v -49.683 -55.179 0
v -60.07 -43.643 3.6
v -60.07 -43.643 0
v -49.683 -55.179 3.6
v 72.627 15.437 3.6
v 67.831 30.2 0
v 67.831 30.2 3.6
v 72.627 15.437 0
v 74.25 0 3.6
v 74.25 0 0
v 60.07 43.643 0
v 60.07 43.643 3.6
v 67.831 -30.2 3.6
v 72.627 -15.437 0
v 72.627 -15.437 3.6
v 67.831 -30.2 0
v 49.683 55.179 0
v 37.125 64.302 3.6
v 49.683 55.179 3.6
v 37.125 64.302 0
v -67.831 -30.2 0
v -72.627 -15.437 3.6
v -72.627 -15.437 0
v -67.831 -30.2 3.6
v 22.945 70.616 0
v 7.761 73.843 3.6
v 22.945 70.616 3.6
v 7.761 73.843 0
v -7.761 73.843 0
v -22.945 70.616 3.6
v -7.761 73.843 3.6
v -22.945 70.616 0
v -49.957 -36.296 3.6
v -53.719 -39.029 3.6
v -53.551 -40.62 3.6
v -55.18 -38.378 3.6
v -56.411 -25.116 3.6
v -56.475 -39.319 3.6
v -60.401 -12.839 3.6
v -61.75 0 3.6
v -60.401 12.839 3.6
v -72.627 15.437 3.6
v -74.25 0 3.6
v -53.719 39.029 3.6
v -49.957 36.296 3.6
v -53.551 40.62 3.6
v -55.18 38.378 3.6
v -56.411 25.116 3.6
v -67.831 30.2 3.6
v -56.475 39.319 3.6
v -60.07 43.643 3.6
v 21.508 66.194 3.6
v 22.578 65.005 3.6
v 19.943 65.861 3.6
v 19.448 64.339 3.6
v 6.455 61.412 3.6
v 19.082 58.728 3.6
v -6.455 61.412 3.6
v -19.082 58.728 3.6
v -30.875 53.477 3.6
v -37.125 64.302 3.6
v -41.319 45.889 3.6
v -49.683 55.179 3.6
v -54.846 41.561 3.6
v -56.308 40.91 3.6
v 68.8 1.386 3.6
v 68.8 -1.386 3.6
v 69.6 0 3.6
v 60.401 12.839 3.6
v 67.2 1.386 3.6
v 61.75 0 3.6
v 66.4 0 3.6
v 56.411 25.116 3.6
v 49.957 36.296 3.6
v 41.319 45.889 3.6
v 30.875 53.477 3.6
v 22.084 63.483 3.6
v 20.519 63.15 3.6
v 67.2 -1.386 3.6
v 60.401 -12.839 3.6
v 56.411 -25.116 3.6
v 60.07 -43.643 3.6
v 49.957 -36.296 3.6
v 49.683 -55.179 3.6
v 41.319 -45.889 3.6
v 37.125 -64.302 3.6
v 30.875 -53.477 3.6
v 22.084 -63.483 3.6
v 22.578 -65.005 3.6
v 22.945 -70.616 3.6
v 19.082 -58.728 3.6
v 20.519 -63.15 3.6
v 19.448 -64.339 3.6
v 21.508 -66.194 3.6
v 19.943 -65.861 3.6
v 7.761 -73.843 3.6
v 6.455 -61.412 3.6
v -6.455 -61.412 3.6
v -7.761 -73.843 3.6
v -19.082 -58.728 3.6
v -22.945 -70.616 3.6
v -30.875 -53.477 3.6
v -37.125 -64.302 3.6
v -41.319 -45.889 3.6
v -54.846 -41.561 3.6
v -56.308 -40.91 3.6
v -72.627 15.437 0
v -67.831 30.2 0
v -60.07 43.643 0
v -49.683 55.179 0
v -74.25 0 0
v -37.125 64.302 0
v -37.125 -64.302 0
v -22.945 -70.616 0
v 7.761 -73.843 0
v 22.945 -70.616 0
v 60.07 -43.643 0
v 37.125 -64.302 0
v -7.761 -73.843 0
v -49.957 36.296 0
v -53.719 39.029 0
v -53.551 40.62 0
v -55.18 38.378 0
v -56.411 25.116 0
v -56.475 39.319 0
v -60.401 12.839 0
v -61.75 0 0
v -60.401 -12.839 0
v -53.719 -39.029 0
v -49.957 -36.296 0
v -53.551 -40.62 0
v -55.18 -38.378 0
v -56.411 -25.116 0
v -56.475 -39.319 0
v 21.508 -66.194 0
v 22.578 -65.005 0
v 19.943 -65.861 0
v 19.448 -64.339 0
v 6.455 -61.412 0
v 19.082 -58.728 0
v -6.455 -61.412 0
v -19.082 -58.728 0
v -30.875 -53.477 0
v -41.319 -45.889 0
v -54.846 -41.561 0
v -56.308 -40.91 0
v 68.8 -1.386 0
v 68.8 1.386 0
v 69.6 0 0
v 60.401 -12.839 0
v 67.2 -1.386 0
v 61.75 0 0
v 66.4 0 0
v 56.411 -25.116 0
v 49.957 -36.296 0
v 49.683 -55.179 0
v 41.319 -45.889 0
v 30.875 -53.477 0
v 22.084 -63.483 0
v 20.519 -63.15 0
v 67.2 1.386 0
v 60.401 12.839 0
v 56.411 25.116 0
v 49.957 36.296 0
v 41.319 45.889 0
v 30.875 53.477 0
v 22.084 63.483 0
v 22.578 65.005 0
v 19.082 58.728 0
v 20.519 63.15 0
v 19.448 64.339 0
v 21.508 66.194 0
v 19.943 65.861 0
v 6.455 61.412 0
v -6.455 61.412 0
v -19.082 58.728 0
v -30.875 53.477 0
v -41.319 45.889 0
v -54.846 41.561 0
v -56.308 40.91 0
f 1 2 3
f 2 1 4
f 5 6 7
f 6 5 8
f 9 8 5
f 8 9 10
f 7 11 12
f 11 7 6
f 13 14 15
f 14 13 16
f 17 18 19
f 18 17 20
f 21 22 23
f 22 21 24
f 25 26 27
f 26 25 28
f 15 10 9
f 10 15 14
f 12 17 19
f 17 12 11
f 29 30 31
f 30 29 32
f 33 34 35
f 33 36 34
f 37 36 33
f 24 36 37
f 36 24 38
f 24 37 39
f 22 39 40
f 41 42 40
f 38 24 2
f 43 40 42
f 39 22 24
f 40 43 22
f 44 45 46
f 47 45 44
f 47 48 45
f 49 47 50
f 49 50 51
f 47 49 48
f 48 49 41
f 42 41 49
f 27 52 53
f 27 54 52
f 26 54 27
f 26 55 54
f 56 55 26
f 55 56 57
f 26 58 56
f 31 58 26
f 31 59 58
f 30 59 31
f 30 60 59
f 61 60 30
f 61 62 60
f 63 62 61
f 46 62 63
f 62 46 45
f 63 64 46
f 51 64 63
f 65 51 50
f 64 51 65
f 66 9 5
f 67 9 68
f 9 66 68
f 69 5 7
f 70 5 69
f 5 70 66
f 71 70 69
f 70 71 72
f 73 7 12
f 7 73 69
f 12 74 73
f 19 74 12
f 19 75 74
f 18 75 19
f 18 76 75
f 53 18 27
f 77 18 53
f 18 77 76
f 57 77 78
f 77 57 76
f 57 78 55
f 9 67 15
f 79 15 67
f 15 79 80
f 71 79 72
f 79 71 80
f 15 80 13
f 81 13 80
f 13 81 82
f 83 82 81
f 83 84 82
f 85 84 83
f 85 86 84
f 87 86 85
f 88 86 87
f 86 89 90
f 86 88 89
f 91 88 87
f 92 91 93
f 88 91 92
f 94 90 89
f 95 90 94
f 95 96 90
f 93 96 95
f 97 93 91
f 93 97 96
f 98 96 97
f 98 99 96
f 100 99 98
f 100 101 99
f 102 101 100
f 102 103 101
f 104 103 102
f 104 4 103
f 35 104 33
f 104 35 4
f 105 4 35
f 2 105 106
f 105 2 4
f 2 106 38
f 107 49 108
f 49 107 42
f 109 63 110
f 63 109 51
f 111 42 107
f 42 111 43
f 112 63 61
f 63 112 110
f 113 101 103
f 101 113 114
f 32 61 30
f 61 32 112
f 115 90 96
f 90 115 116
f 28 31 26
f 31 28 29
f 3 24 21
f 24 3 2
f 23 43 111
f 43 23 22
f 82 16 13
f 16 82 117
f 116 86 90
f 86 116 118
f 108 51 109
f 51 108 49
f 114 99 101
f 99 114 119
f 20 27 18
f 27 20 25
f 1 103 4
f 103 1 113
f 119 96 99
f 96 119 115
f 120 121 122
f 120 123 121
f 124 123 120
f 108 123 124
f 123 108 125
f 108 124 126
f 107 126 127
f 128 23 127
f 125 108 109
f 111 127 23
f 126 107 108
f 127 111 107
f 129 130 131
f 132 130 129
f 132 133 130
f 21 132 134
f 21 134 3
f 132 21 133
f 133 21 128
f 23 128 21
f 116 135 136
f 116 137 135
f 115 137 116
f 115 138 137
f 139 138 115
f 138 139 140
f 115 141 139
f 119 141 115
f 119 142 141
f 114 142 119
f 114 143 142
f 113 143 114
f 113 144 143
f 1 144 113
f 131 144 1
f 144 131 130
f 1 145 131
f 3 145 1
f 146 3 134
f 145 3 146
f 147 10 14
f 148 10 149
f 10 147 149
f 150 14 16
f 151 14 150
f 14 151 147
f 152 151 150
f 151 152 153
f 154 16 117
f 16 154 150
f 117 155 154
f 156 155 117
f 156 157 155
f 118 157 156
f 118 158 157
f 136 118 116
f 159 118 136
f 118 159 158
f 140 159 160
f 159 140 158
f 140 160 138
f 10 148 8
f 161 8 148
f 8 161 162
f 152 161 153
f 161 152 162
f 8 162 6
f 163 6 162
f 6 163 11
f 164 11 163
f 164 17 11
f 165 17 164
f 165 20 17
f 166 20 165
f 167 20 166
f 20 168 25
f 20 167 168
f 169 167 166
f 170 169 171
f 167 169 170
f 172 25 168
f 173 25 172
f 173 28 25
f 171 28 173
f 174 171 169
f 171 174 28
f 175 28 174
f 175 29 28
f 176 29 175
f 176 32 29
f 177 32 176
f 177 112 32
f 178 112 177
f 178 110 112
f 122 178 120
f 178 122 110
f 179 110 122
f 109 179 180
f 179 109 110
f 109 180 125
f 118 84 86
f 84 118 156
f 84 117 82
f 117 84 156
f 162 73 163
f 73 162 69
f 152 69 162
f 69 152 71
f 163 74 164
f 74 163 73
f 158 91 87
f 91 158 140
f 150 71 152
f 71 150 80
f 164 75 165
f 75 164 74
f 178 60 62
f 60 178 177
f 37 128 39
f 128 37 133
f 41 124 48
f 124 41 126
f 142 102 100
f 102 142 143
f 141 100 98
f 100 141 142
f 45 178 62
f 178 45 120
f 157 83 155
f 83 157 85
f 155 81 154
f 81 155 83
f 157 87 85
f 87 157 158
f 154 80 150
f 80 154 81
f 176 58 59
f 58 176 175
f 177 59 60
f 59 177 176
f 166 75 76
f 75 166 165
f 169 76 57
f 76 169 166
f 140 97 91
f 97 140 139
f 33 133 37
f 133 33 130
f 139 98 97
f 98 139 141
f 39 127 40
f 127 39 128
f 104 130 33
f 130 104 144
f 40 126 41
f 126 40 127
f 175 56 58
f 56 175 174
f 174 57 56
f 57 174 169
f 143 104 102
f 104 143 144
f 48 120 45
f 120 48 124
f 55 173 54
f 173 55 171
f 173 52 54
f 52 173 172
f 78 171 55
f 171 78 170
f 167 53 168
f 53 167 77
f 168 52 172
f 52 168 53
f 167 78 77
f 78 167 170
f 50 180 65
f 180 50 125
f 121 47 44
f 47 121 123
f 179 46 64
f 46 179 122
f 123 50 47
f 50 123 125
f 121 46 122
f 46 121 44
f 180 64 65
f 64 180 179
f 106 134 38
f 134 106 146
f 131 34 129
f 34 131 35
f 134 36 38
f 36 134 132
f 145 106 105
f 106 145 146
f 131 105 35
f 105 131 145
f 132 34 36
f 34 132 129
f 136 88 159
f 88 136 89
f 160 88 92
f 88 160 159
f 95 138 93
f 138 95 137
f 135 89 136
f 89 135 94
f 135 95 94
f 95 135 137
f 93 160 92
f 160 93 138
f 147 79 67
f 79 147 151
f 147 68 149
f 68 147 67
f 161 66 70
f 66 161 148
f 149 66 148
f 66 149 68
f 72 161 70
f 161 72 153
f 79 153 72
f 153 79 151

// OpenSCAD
// mockup of 42cm xenar flange mount.
// 5-bolt, 148.5mm OD, 123.5mm ID. 3.6mm thick

//$fn=64;

difference(){
    cylinder(d=148.5,h=3.6);
    //center hole
    cylinder(d=123.5,h=10,center=true);
    rotate([0,0,72]) translate([(148.5+123.5)/4,0,0]) cylinder(d=3.2,h=10,center=true);
    rotate([0,0,72*2]) translate([(148.5+123.5)/4,0,0]) cylinder(d=3.2,h=10,center=true);
    rotate([0,0,72*3]) translate([(148.5+123.5)/4,0,0]) cylinder(d=3.2,h=10,center=true);
    rotate([0,0,72*4]) translate([(148.5+123.5)/4,0,0]) cylinder(d=3.2,h=10,center=true);
    rotate([0,0,72*5]) translate([(148.5+123.5)/4,0,0]) cylinder(d=3.2,h=10,center=true);
}
